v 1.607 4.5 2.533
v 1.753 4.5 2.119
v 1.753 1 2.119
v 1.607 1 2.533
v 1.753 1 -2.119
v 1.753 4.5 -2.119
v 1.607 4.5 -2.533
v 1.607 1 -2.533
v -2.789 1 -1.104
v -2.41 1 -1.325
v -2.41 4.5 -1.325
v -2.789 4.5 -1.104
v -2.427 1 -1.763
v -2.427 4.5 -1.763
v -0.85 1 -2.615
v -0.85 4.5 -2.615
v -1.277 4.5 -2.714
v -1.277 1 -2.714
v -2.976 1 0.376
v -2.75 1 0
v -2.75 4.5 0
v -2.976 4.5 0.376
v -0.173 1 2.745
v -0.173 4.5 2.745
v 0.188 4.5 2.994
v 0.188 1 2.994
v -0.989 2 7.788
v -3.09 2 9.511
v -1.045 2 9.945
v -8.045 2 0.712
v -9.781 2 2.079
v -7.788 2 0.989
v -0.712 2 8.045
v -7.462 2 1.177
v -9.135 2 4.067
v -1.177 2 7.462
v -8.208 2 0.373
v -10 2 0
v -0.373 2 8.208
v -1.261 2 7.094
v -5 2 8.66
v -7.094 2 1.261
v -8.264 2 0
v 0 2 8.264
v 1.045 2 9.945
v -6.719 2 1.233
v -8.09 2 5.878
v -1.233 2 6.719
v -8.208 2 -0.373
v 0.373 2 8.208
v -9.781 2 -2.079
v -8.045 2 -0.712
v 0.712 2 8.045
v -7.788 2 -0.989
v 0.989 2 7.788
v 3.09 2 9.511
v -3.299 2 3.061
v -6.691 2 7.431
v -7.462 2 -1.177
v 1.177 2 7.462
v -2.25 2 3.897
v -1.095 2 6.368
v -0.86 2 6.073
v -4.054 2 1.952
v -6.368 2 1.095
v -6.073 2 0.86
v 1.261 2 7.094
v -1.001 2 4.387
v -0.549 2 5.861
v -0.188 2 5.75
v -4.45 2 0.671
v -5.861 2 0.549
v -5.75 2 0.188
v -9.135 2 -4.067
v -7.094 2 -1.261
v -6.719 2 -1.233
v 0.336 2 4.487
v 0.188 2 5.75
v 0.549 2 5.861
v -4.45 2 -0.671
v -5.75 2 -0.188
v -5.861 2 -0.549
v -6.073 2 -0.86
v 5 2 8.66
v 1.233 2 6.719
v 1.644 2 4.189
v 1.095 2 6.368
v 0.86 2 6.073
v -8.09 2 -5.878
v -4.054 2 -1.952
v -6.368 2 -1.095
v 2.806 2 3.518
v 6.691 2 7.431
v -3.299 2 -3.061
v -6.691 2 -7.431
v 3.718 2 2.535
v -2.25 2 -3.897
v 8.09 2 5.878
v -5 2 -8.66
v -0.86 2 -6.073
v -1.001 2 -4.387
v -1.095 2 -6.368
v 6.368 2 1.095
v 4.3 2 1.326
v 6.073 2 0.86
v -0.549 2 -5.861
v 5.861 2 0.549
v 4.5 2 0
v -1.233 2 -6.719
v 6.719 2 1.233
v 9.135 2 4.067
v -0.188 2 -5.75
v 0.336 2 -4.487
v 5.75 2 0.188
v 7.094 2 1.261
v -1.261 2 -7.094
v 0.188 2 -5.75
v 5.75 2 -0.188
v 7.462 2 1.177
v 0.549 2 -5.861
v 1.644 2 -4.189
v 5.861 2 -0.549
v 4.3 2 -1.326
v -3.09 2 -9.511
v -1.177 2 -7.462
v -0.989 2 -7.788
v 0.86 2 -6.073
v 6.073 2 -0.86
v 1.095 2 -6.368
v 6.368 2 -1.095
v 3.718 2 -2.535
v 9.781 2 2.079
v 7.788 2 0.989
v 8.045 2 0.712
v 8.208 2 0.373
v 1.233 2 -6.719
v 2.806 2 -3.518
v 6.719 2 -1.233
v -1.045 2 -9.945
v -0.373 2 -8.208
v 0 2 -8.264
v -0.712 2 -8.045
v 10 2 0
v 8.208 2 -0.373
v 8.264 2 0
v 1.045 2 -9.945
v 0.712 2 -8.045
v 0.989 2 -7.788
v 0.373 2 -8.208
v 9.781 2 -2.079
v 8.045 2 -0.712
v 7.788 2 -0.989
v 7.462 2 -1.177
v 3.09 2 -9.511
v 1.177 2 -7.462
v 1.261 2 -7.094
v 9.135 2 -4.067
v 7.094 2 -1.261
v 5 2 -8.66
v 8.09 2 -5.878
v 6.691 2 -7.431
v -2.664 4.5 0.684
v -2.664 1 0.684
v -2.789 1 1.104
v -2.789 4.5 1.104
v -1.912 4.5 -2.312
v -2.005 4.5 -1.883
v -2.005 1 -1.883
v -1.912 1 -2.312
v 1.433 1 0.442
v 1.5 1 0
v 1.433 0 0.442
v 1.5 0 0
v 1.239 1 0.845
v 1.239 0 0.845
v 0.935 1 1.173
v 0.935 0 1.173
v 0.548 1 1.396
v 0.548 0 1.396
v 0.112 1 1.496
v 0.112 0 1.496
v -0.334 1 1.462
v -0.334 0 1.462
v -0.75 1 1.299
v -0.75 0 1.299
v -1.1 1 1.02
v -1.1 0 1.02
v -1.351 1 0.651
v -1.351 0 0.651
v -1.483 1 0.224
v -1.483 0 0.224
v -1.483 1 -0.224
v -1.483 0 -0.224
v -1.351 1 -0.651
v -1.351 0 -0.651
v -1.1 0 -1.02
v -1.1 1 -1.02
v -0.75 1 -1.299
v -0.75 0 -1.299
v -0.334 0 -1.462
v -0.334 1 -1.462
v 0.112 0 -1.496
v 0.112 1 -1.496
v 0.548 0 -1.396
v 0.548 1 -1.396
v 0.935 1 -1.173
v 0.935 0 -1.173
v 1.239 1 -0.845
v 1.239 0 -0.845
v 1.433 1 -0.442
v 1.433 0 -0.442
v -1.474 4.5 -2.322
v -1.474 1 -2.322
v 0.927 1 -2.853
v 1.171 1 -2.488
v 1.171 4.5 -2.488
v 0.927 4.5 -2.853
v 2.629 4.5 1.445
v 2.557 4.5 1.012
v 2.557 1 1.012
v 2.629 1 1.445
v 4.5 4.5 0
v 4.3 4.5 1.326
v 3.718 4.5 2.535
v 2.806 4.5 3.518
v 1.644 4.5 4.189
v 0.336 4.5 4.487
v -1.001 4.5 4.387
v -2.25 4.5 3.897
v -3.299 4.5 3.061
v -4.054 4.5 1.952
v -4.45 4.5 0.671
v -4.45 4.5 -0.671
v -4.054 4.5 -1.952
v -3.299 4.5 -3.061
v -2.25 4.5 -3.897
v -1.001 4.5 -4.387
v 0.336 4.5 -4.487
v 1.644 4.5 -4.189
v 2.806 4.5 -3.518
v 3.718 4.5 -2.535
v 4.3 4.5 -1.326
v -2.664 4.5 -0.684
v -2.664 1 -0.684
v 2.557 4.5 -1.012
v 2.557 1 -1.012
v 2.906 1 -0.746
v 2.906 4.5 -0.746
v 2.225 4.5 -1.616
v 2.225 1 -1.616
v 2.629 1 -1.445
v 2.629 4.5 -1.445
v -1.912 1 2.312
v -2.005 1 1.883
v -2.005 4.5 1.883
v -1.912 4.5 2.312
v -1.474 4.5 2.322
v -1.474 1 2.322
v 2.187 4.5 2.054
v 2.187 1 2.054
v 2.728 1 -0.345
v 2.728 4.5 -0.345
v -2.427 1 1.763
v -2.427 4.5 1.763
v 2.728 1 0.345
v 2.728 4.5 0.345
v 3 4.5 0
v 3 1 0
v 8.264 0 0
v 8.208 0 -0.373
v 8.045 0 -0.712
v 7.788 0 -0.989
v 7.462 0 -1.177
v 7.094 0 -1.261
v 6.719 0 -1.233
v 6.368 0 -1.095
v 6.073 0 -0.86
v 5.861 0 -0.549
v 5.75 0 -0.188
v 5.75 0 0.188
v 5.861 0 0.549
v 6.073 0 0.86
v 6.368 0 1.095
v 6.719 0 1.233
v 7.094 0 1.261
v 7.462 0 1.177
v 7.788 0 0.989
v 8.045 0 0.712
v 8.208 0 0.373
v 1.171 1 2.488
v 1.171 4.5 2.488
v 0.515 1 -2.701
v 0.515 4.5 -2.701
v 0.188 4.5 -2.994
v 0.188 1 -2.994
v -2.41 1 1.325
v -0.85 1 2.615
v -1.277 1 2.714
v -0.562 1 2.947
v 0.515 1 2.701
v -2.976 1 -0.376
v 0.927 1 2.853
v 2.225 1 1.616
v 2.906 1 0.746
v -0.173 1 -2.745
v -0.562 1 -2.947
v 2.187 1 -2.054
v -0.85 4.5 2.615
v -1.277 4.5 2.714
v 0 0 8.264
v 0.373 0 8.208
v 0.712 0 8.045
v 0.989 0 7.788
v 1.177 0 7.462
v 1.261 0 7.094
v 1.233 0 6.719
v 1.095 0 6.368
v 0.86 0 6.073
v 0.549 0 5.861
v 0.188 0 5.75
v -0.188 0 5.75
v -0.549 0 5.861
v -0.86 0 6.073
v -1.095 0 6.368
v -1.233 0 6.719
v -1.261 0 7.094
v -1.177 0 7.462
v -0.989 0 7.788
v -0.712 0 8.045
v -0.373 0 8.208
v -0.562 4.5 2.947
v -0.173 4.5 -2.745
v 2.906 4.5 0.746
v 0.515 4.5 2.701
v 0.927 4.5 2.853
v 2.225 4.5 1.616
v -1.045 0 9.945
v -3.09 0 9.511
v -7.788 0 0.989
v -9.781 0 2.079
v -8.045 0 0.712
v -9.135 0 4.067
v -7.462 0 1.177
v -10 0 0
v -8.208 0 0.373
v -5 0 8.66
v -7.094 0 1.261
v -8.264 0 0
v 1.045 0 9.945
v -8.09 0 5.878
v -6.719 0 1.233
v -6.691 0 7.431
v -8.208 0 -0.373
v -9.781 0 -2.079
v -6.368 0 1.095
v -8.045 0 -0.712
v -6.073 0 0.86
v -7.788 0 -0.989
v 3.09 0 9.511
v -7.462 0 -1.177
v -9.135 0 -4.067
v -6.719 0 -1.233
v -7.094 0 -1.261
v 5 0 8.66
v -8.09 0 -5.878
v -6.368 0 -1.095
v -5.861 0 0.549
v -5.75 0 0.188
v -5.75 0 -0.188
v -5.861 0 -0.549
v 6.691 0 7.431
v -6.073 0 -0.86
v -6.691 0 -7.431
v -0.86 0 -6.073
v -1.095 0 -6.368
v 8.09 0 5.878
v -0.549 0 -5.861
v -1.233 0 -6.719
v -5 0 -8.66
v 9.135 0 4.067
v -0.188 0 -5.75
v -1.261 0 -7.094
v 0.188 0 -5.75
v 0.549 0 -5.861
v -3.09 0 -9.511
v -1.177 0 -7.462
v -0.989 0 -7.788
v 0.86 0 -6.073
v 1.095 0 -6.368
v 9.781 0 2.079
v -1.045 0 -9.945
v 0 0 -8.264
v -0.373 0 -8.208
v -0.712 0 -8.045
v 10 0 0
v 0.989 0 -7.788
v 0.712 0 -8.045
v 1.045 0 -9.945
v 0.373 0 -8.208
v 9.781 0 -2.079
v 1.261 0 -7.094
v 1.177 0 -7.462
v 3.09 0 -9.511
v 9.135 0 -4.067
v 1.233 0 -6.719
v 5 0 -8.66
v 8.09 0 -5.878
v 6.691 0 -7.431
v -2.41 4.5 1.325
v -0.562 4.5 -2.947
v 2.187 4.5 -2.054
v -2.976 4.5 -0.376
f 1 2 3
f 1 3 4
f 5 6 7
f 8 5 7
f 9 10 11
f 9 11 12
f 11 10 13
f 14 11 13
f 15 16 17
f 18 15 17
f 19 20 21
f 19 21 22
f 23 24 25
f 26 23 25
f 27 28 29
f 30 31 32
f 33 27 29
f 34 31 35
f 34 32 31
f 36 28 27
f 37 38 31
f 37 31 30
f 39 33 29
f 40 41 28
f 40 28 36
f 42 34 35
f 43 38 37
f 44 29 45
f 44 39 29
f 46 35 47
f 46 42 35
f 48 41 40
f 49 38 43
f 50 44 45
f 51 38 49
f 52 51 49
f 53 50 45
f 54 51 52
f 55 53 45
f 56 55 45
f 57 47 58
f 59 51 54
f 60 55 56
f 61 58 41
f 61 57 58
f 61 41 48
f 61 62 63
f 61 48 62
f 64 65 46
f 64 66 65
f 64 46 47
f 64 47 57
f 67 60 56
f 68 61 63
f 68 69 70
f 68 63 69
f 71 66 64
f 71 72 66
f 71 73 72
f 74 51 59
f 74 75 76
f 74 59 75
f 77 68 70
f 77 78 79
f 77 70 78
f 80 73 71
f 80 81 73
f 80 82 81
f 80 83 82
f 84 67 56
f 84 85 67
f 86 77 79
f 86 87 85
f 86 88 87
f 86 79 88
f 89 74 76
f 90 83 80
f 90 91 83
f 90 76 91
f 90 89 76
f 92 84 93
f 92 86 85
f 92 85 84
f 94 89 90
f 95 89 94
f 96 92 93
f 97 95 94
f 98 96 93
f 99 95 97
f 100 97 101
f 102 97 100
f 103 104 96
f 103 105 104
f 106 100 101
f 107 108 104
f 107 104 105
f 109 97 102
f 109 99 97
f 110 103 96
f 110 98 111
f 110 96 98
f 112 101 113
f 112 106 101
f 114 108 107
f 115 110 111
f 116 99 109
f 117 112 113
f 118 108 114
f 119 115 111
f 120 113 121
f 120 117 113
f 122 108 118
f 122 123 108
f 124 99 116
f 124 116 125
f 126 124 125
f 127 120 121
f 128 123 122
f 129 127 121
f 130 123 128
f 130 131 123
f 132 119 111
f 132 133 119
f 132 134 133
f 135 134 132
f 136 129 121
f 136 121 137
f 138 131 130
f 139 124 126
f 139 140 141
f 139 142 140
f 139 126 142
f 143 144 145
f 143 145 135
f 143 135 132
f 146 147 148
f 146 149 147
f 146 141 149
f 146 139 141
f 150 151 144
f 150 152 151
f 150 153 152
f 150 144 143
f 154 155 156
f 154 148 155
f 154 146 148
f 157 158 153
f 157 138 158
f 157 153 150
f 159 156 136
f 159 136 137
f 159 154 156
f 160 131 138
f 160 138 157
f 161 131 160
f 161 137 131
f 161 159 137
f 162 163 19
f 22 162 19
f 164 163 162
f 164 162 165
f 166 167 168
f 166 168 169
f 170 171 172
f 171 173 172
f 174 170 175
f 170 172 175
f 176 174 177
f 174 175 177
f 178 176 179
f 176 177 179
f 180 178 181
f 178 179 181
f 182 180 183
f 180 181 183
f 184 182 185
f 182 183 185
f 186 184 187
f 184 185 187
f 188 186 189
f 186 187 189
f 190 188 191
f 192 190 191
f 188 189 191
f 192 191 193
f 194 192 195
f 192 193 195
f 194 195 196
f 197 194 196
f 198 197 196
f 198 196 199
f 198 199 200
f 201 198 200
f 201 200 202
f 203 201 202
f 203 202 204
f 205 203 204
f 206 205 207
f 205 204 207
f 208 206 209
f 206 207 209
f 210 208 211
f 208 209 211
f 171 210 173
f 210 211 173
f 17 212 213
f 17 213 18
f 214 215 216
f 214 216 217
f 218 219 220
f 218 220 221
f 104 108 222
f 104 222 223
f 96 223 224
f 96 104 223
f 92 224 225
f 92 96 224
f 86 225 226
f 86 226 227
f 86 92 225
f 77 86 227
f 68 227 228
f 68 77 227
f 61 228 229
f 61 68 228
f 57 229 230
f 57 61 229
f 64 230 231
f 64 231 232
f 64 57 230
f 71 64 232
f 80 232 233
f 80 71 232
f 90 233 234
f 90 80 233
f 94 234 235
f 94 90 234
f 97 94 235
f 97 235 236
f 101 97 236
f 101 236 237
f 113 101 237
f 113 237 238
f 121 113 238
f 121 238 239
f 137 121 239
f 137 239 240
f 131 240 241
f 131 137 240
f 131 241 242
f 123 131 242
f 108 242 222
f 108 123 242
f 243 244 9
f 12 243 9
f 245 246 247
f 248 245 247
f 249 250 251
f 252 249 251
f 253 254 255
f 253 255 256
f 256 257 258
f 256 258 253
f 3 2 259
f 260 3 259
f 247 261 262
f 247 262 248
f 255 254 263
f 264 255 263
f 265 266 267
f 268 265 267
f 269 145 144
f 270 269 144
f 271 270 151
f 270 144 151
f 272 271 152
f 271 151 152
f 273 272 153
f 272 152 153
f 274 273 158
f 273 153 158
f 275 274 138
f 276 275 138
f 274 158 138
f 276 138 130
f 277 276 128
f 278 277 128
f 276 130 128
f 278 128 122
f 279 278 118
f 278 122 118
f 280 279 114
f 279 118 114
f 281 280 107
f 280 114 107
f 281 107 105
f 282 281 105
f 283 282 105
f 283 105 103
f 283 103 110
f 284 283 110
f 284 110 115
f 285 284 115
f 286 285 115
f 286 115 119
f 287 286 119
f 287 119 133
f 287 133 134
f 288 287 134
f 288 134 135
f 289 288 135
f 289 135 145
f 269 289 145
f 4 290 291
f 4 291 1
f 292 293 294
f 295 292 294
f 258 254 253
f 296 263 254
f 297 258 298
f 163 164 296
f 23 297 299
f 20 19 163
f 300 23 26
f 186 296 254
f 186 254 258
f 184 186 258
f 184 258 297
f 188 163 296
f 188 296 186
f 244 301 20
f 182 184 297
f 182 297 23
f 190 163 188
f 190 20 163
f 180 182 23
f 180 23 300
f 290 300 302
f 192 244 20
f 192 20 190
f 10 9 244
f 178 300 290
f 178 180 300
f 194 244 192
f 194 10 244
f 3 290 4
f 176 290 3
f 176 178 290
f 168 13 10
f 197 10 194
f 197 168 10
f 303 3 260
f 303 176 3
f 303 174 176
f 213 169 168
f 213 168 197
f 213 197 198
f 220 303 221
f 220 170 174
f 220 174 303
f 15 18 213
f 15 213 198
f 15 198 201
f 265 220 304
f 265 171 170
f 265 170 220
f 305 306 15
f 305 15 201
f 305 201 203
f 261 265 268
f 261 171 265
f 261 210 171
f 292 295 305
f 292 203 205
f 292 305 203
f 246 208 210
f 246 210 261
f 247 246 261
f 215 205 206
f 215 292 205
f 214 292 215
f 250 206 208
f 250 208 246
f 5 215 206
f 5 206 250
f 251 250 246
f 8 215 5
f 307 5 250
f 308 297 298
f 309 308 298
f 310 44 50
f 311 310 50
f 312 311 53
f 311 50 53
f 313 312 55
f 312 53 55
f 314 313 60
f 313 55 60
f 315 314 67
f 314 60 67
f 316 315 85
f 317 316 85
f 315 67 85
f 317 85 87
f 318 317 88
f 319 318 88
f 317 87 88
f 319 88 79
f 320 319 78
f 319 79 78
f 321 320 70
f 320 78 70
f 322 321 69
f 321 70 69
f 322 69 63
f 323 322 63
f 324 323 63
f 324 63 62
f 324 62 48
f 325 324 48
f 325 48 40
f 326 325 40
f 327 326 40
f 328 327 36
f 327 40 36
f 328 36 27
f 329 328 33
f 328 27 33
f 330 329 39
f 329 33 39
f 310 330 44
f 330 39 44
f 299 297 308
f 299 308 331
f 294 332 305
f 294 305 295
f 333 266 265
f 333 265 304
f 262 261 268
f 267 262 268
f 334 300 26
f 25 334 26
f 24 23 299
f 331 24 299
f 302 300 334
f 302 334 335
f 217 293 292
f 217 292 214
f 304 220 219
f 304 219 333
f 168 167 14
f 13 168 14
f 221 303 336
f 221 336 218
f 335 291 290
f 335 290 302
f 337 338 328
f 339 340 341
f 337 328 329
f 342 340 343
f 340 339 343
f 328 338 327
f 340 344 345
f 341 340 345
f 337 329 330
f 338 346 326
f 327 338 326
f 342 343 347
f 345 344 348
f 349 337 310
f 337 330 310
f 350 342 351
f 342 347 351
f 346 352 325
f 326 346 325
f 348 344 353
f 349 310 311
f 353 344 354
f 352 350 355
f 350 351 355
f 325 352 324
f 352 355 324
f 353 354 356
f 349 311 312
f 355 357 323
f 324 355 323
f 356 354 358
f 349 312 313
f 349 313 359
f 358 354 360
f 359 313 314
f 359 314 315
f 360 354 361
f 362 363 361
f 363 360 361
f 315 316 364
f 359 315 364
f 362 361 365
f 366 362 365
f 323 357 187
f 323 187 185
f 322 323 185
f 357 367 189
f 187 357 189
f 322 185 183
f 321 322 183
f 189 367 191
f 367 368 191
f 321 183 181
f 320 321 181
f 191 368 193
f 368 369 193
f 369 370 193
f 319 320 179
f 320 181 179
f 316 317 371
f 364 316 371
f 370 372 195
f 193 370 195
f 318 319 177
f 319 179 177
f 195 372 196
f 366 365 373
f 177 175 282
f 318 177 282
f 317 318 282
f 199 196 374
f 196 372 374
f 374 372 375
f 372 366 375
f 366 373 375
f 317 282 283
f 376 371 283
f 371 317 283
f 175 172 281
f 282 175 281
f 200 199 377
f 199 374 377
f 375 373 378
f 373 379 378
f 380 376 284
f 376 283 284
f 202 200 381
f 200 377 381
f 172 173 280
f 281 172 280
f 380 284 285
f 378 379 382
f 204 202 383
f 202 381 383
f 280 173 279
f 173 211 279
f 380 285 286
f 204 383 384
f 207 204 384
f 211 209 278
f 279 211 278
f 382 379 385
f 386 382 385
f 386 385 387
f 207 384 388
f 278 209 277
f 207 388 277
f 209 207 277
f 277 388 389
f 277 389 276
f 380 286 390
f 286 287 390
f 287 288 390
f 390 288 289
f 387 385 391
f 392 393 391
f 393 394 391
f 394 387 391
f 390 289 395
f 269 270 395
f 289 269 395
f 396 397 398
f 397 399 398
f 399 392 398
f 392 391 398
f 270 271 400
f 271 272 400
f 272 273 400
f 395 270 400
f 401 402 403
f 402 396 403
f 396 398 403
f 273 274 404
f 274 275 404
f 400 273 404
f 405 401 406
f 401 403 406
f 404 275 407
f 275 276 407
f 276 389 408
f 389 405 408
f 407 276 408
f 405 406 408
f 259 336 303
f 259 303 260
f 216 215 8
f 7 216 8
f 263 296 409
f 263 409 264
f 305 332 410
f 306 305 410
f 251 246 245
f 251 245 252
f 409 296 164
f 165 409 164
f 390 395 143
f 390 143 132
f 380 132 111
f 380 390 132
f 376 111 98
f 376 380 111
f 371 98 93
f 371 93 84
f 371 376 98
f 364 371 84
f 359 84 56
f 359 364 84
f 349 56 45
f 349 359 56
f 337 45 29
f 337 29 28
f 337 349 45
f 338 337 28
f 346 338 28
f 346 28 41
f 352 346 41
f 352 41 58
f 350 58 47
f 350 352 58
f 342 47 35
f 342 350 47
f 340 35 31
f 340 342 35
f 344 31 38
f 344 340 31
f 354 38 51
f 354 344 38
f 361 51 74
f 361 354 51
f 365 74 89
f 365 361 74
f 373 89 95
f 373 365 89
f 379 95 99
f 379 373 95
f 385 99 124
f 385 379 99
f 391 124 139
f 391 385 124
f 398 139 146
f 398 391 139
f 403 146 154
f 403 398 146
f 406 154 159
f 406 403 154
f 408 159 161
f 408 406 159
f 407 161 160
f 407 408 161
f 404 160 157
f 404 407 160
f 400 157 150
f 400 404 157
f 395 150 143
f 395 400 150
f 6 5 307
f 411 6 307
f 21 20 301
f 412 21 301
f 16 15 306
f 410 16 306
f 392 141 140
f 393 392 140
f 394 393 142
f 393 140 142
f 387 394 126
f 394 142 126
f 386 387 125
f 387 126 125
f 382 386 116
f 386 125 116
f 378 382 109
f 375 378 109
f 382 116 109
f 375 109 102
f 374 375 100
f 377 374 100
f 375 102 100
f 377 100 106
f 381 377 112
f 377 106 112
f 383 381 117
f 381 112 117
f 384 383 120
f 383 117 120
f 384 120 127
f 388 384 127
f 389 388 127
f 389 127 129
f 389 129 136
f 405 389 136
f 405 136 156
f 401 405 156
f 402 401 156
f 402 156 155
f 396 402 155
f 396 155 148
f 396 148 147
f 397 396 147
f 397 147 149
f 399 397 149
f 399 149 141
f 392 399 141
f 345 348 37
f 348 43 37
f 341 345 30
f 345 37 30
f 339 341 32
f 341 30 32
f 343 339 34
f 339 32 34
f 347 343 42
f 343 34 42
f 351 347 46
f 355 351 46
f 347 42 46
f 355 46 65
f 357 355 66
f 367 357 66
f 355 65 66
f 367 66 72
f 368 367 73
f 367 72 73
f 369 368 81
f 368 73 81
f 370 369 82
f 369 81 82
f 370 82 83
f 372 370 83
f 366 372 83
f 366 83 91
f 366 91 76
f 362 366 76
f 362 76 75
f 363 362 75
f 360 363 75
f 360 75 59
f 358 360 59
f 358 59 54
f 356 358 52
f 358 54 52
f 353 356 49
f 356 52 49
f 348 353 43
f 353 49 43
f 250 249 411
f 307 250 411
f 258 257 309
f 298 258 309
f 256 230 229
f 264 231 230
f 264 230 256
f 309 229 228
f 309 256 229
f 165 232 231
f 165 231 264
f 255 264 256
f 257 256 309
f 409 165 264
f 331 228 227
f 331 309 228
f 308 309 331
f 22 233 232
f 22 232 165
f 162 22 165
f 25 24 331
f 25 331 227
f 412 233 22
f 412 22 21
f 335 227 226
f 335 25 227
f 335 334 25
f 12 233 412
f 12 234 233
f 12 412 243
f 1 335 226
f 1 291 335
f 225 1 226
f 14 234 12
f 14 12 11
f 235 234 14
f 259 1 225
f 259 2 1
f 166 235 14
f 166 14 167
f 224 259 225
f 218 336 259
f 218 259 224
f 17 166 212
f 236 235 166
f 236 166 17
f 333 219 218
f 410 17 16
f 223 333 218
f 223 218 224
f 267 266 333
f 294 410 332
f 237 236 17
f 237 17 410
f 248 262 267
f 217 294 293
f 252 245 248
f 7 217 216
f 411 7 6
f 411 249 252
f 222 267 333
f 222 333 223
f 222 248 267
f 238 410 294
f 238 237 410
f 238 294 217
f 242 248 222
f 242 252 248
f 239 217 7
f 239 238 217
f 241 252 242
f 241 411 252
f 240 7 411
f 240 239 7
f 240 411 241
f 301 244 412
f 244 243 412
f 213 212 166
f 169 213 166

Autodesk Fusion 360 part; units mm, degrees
sketch "Sketch1" plane through (0, 0, 0) normal (0, 1, 0) x (1, 0, 0)
  circle A0 centre (0, 0) radius 10
  circle A1 centre (0, 0) radius 4.5
  circle A2 centre (0, 0) radius 2.75
  circle A3 centre (0, 0) radius 1.5
  dimension "d1" = 20
  dimension "d2" = 9
  dimension "d3" = 5.5
  dimension "d4" = 3
extrude "Extrude1" add sketch "Sketch1" along normal blind 2 contours A0
extrude "Extrude2" add sketch "Sketch1" along normal blind 4.5 contours A1
extrude "Extrude3" add sketch "Sketch1" along normal blind 1 contours A2
sketch "Sketch2" plane through (0, 2, 0) normal (0, 1, 0) x (-1, 0, 0)
  circle A0 centre (0, 0) radius 4.5
  circle A1 centre (0, 0) radius 10
  circle A2 centre (0, 0) radius 7
  line L0 (0, 0) -> (7, 0)
  circle A3 centre (7, 0) radius 1.5
  dimension "d11" = 14
  dimension "d12" = 3
extrude "Extrude4" cut sketch "Sketch2" against normal blind 2 contours A2 L0 A3 | A2 A3 | A2 L0 A3 picked at (7.4507, 0.3705)
pattern_circular "C-Pattern1" count 4 over 360 about axis through (0, 1.75, 0) along (0, 1, 0) of "Extrude4"
thread "Thread1" "ISO Metric profile 3.0 M3x0.5 6H" major diameter 3.086 minor diameter 2.529 pitch 0.5 angle 60 resizes the face on face at (-8.4925, 0.6667, -0.1494)
thread "Thread2" "ISO Metric profile 3.0 M3x0.5 6H" major diameter 3.086 minor diameter 2.529 pitch 0.5 angle 60 resizes the face on face at (0.0748, 1.3333, -8.4981)
thread "Thread3" "ISO Metric profile 3.0 M3x0.5 6H" major diameter 3.086 minor diameter 2.529 pitch 0.5 angle 60 resizes the face on face at (-0.0748, 1.3333, 8.4981)
thread "Thread4" "ISO Metric profile 3.0 M3x0.5 6H" major diameter 3.086 minor diameter 2.529 pitch 0.5 angle 60 resizes the face on face at (8.4981, 1.3333, 0.0748)
sketch "Sketch3" plane through (0, 4.5, 0) normal (0, 1, 0) x (-1, 0, 0)
  circle A0 centre (0, 0) radius 2.75
  circle A1 centre (0, 0) radius 4.5
  circle A2 centre (0, 0) radius 3
  line L0 (0, 0) -> (3, 0)
  line L1 (0, 0) -> (2.9763, -0.376)
  line L2 (0, 0) -> (2.9057, -0.7461)
  line L3 (2.75, 0) -> (2.9763, -0.376)
  line L4 (2.6636, -0.6839) -> (2.9763, -0.376)
  dimension "d18" = 7.2
  dimension "d19" = 7.2
  dimension "d20" = 6
extrude "Extrude5" cut sketch "Sketch3" against normal blind 3.5 contours A0 L1 L3 | A0 L1 L4
pattern_circular "C-Pattern2" count 25 over 360 about axis through (0, 1.75, 0) along (0, 1, 0) of "Extrude5"
